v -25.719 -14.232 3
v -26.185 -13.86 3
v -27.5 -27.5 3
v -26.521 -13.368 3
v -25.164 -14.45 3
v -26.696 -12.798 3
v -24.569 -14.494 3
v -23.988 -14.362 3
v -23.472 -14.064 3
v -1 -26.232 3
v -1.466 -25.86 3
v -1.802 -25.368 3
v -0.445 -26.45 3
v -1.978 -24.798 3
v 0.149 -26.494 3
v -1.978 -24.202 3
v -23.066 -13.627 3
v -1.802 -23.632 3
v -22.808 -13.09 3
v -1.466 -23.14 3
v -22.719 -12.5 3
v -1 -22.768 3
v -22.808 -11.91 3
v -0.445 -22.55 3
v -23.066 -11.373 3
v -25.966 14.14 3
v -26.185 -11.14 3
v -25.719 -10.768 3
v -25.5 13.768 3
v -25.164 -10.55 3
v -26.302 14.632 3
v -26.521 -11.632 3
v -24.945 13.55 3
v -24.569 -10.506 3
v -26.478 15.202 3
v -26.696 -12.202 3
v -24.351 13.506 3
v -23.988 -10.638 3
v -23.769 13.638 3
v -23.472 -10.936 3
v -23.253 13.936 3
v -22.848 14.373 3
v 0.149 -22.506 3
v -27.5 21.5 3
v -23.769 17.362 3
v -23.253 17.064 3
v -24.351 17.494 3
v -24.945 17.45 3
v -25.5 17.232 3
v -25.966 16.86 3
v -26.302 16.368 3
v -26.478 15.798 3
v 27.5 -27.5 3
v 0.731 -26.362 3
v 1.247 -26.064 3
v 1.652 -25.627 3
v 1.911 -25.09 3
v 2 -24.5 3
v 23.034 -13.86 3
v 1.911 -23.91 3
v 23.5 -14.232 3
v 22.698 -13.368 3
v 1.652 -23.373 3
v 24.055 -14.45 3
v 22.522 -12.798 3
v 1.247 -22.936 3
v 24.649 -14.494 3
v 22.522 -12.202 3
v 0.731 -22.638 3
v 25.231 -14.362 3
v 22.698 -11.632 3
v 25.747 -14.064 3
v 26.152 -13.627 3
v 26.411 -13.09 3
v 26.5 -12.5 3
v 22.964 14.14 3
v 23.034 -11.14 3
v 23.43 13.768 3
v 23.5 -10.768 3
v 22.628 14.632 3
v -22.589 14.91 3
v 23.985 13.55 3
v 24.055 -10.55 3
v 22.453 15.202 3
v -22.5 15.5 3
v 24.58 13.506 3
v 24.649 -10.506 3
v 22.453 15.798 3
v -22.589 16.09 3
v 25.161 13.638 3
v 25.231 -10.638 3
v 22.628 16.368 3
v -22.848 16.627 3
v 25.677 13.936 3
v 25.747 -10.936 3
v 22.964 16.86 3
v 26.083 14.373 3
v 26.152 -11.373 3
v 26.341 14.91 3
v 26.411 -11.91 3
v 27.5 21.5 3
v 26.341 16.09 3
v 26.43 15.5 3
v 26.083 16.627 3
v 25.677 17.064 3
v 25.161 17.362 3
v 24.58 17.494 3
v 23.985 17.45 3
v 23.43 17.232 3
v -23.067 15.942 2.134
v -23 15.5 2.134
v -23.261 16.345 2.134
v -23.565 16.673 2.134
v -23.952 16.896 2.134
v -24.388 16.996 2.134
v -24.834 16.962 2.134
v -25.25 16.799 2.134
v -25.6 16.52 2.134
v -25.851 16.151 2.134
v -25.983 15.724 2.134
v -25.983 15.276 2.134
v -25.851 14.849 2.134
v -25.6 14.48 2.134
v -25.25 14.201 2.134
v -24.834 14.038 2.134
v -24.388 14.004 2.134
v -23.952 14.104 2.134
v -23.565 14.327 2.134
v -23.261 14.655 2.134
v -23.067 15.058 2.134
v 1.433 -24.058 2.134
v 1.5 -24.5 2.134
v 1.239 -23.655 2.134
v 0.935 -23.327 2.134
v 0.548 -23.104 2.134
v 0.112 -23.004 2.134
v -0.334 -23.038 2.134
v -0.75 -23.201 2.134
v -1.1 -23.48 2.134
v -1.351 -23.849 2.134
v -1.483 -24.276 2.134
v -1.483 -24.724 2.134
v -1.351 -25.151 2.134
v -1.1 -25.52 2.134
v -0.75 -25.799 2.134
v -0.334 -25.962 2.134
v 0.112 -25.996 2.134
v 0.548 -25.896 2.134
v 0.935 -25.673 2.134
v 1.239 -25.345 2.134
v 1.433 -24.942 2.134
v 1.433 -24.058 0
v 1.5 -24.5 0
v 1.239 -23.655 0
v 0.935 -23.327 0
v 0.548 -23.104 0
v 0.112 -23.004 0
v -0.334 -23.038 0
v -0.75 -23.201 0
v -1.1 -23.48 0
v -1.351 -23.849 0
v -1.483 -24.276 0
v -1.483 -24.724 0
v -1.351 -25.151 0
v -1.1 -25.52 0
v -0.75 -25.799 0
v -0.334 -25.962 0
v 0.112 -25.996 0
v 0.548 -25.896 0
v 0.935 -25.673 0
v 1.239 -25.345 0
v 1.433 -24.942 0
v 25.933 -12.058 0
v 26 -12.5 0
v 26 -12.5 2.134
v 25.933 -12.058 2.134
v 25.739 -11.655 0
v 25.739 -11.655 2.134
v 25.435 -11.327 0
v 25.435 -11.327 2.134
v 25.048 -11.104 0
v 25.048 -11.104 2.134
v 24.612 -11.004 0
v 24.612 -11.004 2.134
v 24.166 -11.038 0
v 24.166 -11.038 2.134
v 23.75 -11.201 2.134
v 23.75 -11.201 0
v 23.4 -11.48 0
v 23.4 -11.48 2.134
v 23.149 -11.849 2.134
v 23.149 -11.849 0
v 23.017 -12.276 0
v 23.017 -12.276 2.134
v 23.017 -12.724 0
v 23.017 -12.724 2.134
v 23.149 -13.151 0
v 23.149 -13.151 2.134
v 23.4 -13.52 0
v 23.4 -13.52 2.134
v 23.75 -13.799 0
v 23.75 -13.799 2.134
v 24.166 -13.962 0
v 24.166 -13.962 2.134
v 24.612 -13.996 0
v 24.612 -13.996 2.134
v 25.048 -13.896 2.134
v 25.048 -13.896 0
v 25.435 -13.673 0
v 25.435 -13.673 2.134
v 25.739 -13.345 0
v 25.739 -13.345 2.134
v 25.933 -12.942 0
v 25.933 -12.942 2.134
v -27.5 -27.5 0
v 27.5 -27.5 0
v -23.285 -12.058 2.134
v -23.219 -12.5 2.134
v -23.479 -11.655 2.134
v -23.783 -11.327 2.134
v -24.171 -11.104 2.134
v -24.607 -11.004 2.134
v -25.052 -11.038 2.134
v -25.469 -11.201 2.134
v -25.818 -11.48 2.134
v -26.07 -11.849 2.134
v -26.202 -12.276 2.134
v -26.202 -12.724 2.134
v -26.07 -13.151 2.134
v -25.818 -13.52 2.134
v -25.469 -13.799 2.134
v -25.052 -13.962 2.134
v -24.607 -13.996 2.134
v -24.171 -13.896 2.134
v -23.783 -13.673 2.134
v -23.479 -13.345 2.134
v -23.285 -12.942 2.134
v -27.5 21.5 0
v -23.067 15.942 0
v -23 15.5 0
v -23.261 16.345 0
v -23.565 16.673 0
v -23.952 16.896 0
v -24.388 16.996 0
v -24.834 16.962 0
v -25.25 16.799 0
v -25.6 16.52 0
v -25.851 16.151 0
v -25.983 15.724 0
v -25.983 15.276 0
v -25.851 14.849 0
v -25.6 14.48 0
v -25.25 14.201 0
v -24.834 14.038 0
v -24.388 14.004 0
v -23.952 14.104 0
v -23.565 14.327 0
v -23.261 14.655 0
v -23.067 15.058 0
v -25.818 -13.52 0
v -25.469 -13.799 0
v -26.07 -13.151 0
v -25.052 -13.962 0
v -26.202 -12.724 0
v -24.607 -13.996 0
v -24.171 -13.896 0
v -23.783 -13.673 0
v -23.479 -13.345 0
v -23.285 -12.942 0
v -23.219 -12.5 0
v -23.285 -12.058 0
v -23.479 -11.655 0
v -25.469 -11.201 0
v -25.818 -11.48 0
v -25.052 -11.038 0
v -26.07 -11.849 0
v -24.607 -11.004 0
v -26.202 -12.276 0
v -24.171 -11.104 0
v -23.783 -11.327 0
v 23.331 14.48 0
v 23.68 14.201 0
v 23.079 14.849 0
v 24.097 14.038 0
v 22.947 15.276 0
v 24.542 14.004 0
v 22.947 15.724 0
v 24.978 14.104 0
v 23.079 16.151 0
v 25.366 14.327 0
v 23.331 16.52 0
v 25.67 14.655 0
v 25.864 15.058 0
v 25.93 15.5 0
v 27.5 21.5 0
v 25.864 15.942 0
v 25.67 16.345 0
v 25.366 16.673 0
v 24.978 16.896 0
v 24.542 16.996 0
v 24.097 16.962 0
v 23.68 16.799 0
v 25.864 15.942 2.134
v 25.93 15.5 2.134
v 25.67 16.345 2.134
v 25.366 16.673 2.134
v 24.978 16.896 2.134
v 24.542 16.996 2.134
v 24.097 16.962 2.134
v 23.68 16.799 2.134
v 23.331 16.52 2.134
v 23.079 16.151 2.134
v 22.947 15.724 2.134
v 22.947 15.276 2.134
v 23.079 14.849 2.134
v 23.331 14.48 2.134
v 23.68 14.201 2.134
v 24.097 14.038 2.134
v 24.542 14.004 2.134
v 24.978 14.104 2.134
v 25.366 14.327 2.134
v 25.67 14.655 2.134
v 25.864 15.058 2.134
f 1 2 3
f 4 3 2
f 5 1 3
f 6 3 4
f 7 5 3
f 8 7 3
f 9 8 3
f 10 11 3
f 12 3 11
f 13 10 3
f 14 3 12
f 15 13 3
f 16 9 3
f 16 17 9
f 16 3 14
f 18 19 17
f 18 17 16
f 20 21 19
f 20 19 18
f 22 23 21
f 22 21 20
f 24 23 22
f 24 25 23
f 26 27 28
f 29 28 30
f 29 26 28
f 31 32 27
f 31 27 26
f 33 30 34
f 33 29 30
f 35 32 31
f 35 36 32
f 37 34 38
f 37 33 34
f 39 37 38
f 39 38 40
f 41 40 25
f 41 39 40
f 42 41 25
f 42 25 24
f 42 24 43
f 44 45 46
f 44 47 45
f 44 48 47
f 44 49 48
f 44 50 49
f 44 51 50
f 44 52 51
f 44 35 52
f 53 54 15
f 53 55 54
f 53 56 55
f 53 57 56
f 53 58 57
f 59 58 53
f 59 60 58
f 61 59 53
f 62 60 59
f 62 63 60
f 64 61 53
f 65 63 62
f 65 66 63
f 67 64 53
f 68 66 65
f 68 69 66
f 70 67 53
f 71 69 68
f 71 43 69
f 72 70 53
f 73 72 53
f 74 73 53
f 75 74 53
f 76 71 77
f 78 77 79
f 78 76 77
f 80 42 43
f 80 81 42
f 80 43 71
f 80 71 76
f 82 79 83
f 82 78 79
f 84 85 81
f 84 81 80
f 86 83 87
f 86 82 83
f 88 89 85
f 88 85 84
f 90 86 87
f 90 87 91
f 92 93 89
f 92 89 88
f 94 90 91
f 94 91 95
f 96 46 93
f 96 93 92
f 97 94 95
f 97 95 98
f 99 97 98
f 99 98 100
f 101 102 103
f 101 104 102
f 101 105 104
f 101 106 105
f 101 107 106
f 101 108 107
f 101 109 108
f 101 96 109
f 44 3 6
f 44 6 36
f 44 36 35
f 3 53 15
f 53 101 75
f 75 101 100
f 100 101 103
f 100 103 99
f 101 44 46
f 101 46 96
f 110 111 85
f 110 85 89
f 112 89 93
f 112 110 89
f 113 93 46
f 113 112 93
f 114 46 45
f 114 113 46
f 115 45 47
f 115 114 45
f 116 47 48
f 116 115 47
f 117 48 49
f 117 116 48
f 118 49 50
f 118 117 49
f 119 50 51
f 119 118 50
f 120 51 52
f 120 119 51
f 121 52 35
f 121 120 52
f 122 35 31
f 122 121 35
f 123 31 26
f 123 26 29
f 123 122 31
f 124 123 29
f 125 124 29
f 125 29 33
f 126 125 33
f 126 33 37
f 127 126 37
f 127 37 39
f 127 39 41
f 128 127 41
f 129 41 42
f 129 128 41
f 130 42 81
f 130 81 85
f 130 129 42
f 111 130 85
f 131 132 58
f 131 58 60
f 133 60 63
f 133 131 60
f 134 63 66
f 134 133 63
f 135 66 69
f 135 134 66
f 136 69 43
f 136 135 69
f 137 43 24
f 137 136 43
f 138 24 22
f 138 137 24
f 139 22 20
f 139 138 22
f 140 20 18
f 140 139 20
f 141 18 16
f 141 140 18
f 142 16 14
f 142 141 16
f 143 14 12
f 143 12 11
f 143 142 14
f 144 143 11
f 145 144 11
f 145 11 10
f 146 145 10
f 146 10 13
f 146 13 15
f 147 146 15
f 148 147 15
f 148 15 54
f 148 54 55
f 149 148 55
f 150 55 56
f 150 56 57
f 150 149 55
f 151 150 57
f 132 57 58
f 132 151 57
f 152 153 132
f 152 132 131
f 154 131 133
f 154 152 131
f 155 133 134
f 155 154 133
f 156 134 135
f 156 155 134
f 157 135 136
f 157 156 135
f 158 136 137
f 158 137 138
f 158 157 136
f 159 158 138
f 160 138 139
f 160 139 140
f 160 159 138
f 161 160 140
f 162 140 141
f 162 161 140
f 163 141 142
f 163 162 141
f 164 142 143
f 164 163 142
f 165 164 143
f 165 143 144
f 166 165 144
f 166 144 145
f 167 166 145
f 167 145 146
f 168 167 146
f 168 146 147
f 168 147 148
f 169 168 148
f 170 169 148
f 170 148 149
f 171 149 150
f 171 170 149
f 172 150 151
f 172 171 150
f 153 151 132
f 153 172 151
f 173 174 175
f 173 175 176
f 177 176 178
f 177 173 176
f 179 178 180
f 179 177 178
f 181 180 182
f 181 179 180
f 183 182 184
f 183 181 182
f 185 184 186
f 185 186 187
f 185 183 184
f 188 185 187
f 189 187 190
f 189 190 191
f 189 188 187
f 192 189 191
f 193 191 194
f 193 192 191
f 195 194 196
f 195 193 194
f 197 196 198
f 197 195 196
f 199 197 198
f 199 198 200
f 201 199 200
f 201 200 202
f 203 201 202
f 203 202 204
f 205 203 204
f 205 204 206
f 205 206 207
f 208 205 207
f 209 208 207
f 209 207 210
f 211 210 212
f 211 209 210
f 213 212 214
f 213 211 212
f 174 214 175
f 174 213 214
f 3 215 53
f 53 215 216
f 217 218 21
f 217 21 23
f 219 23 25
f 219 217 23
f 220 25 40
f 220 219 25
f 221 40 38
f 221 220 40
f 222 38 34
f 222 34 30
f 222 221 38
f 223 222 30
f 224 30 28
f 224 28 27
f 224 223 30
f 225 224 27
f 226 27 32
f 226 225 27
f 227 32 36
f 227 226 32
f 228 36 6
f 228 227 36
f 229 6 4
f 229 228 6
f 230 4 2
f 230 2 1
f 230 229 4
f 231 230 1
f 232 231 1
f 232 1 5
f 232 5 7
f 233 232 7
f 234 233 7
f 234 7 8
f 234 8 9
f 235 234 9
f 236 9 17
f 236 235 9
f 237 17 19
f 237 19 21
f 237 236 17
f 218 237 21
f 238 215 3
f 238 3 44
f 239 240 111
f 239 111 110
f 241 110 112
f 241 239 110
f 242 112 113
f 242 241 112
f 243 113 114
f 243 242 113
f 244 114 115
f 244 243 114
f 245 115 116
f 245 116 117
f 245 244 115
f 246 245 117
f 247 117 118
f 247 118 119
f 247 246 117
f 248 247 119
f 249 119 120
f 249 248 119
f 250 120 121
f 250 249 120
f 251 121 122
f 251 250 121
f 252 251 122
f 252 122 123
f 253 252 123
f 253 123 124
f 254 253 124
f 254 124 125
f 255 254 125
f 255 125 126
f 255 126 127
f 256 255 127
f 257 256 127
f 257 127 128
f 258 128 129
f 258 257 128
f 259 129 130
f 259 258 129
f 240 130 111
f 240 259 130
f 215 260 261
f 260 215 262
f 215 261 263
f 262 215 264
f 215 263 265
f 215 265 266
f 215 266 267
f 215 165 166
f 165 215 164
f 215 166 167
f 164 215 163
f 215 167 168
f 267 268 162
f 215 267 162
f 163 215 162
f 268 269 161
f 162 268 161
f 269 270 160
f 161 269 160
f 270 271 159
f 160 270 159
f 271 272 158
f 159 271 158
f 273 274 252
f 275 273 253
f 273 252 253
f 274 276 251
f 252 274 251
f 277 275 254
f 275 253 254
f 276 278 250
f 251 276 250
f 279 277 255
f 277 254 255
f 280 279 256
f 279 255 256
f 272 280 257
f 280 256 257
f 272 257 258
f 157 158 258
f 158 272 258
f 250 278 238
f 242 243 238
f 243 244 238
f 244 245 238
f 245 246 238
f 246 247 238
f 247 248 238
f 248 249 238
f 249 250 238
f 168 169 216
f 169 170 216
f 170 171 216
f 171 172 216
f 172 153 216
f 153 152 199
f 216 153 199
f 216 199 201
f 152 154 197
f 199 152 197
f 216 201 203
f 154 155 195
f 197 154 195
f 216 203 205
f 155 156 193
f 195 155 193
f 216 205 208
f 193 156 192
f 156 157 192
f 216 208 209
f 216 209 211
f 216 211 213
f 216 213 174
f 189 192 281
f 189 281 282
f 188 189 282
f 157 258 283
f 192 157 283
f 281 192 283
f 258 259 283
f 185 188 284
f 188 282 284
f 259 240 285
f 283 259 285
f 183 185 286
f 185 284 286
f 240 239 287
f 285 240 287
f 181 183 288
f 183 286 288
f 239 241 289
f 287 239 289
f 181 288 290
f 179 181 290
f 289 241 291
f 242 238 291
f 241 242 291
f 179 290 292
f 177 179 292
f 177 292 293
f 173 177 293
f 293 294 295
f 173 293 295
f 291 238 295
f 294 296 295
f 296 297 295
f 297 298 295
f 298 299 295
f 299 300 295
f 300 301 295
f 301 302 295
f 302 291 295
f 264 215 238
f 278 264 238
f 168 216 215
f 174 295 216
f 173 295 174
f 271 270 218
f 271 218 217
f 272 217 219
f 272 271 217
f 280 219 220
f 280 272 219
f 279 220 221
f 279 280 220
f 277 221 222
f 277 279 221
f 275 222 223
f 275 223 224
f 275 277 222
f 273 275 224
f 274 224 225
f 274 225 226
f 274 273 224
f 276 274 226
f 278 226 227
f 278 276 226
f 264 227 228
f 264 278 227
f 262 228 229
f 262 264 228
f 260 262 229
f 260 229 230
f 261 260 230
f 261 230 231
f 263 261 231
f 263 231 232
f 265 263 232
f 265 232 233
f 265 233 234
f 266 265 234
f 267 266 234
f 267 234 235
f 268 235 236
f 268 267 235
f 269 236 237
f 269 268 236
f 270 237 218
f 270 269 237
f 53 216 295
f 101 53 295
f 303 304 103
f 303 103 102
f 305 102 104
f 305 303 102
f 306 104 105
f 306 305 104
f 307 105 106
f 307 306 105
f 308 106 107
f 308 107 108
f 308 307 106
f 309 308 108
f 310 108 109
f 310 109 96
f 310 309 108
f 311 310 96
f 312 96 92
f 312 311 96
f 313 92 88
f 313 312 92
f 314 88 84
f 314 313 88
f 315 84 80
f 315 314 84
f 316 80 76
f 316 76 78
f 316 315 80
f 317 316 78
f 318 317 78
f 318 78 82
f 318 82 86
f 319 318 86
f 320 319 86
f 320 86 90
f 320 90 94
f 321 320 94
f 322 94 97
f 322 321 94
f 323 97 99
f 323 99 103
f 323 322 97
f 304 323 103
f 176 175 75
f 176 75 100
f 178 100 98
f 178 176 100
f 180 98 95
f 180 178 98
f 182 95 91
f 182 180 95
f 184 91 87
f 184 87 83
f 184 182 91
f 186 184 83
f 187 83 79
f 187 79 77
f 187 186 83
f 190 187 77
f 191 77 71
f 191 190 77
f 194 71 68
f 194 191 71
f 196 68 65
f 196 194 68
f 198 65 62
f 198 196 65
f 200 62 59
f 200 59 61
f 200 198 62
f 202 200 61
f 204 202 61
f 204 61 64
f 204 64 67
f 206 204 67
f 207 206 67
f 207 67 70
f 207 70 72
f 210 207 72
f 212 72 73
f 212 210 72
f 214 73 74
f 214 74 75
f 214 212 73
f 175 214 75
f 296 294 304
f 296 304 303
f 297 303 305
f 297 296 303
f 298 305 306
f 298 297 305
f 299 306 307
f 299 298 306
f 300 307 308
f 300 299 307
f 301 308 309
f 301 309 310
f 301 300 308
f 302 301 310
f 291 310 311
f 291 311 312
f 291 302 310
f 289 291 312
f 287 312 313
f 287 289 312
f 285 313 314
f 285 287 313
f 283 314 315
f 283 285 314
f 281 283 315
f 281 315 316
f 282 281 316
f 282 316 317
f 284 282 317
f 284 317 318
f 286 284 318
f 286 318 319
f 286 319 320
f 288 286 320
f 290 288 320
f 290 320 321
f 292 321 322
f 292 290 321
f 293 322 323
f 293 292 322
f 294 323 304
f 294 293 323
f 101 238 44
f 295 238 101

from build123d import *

# Parameters (mm, degrees)
SKETCH_1_W      = 55
SKETCH_1_H      = 49
SKETCH_1_R      = 1.5
EXTRUDE_1_DEPTH = 3
CHAMFER_1_SIZE  = 0.5
CHAMFER_1_SIZE2 = 0.866025404


with BuildPart() as part:
    # Эскиз1 → Бобышка-Вытянуть1 (new body)
    with BuildSketch(Plane.XY):
        with Locations((0, -3)):
            Rectangle(SKETCH_1_W, SKETCH_1_H)
        with Locations((-24.5, 15.5)):
            Circle(SKETCH_1_R, mode=Mode.SUBTRACT)
        with Locations((-24.71865387, -12.5)):
            Circle(SKETCH_1_R, mode=Mode.SUBTRACT)
        with Locations((24.5, -12.5)):
            Circle(SKETCH_1_R, mode=Mode.SUBTRACT)
        with Locations((24.430350012, 15.5)):
            Circle(SKETCH_1_R, mode=Mode.SUBTRACT)
        with Locations((0, -24.5)):
            Circle(SKETCH_1_R, mode=Mode.SUBTRACT)
    extrude(amount=EXTRUDE_1_DEPTH)

    # Фаска1
    chamfer_1_edges = [part.edges().sort_by_distance(p)[0] for p in [
        (-26, 15.5, 3),
        (-26.21865387, -12.5, 3),
        (23, -12.5, 3),
        (22.930350012, 15.5, 3),
        (-1.5, -24.5, 3),
    ]]
    chamfer_1_side = [part.faces().sort_by_distance(p)[0] for p in [
        (0.000766227, -2.990698033, 3),
    ]]
    chamfer(chamfer_1_edges, length=CHAMFER_1_SIZE, length2=CHAMFER_1_SIZE2, reference=chamfer_1_side[0])


solid = part.part
